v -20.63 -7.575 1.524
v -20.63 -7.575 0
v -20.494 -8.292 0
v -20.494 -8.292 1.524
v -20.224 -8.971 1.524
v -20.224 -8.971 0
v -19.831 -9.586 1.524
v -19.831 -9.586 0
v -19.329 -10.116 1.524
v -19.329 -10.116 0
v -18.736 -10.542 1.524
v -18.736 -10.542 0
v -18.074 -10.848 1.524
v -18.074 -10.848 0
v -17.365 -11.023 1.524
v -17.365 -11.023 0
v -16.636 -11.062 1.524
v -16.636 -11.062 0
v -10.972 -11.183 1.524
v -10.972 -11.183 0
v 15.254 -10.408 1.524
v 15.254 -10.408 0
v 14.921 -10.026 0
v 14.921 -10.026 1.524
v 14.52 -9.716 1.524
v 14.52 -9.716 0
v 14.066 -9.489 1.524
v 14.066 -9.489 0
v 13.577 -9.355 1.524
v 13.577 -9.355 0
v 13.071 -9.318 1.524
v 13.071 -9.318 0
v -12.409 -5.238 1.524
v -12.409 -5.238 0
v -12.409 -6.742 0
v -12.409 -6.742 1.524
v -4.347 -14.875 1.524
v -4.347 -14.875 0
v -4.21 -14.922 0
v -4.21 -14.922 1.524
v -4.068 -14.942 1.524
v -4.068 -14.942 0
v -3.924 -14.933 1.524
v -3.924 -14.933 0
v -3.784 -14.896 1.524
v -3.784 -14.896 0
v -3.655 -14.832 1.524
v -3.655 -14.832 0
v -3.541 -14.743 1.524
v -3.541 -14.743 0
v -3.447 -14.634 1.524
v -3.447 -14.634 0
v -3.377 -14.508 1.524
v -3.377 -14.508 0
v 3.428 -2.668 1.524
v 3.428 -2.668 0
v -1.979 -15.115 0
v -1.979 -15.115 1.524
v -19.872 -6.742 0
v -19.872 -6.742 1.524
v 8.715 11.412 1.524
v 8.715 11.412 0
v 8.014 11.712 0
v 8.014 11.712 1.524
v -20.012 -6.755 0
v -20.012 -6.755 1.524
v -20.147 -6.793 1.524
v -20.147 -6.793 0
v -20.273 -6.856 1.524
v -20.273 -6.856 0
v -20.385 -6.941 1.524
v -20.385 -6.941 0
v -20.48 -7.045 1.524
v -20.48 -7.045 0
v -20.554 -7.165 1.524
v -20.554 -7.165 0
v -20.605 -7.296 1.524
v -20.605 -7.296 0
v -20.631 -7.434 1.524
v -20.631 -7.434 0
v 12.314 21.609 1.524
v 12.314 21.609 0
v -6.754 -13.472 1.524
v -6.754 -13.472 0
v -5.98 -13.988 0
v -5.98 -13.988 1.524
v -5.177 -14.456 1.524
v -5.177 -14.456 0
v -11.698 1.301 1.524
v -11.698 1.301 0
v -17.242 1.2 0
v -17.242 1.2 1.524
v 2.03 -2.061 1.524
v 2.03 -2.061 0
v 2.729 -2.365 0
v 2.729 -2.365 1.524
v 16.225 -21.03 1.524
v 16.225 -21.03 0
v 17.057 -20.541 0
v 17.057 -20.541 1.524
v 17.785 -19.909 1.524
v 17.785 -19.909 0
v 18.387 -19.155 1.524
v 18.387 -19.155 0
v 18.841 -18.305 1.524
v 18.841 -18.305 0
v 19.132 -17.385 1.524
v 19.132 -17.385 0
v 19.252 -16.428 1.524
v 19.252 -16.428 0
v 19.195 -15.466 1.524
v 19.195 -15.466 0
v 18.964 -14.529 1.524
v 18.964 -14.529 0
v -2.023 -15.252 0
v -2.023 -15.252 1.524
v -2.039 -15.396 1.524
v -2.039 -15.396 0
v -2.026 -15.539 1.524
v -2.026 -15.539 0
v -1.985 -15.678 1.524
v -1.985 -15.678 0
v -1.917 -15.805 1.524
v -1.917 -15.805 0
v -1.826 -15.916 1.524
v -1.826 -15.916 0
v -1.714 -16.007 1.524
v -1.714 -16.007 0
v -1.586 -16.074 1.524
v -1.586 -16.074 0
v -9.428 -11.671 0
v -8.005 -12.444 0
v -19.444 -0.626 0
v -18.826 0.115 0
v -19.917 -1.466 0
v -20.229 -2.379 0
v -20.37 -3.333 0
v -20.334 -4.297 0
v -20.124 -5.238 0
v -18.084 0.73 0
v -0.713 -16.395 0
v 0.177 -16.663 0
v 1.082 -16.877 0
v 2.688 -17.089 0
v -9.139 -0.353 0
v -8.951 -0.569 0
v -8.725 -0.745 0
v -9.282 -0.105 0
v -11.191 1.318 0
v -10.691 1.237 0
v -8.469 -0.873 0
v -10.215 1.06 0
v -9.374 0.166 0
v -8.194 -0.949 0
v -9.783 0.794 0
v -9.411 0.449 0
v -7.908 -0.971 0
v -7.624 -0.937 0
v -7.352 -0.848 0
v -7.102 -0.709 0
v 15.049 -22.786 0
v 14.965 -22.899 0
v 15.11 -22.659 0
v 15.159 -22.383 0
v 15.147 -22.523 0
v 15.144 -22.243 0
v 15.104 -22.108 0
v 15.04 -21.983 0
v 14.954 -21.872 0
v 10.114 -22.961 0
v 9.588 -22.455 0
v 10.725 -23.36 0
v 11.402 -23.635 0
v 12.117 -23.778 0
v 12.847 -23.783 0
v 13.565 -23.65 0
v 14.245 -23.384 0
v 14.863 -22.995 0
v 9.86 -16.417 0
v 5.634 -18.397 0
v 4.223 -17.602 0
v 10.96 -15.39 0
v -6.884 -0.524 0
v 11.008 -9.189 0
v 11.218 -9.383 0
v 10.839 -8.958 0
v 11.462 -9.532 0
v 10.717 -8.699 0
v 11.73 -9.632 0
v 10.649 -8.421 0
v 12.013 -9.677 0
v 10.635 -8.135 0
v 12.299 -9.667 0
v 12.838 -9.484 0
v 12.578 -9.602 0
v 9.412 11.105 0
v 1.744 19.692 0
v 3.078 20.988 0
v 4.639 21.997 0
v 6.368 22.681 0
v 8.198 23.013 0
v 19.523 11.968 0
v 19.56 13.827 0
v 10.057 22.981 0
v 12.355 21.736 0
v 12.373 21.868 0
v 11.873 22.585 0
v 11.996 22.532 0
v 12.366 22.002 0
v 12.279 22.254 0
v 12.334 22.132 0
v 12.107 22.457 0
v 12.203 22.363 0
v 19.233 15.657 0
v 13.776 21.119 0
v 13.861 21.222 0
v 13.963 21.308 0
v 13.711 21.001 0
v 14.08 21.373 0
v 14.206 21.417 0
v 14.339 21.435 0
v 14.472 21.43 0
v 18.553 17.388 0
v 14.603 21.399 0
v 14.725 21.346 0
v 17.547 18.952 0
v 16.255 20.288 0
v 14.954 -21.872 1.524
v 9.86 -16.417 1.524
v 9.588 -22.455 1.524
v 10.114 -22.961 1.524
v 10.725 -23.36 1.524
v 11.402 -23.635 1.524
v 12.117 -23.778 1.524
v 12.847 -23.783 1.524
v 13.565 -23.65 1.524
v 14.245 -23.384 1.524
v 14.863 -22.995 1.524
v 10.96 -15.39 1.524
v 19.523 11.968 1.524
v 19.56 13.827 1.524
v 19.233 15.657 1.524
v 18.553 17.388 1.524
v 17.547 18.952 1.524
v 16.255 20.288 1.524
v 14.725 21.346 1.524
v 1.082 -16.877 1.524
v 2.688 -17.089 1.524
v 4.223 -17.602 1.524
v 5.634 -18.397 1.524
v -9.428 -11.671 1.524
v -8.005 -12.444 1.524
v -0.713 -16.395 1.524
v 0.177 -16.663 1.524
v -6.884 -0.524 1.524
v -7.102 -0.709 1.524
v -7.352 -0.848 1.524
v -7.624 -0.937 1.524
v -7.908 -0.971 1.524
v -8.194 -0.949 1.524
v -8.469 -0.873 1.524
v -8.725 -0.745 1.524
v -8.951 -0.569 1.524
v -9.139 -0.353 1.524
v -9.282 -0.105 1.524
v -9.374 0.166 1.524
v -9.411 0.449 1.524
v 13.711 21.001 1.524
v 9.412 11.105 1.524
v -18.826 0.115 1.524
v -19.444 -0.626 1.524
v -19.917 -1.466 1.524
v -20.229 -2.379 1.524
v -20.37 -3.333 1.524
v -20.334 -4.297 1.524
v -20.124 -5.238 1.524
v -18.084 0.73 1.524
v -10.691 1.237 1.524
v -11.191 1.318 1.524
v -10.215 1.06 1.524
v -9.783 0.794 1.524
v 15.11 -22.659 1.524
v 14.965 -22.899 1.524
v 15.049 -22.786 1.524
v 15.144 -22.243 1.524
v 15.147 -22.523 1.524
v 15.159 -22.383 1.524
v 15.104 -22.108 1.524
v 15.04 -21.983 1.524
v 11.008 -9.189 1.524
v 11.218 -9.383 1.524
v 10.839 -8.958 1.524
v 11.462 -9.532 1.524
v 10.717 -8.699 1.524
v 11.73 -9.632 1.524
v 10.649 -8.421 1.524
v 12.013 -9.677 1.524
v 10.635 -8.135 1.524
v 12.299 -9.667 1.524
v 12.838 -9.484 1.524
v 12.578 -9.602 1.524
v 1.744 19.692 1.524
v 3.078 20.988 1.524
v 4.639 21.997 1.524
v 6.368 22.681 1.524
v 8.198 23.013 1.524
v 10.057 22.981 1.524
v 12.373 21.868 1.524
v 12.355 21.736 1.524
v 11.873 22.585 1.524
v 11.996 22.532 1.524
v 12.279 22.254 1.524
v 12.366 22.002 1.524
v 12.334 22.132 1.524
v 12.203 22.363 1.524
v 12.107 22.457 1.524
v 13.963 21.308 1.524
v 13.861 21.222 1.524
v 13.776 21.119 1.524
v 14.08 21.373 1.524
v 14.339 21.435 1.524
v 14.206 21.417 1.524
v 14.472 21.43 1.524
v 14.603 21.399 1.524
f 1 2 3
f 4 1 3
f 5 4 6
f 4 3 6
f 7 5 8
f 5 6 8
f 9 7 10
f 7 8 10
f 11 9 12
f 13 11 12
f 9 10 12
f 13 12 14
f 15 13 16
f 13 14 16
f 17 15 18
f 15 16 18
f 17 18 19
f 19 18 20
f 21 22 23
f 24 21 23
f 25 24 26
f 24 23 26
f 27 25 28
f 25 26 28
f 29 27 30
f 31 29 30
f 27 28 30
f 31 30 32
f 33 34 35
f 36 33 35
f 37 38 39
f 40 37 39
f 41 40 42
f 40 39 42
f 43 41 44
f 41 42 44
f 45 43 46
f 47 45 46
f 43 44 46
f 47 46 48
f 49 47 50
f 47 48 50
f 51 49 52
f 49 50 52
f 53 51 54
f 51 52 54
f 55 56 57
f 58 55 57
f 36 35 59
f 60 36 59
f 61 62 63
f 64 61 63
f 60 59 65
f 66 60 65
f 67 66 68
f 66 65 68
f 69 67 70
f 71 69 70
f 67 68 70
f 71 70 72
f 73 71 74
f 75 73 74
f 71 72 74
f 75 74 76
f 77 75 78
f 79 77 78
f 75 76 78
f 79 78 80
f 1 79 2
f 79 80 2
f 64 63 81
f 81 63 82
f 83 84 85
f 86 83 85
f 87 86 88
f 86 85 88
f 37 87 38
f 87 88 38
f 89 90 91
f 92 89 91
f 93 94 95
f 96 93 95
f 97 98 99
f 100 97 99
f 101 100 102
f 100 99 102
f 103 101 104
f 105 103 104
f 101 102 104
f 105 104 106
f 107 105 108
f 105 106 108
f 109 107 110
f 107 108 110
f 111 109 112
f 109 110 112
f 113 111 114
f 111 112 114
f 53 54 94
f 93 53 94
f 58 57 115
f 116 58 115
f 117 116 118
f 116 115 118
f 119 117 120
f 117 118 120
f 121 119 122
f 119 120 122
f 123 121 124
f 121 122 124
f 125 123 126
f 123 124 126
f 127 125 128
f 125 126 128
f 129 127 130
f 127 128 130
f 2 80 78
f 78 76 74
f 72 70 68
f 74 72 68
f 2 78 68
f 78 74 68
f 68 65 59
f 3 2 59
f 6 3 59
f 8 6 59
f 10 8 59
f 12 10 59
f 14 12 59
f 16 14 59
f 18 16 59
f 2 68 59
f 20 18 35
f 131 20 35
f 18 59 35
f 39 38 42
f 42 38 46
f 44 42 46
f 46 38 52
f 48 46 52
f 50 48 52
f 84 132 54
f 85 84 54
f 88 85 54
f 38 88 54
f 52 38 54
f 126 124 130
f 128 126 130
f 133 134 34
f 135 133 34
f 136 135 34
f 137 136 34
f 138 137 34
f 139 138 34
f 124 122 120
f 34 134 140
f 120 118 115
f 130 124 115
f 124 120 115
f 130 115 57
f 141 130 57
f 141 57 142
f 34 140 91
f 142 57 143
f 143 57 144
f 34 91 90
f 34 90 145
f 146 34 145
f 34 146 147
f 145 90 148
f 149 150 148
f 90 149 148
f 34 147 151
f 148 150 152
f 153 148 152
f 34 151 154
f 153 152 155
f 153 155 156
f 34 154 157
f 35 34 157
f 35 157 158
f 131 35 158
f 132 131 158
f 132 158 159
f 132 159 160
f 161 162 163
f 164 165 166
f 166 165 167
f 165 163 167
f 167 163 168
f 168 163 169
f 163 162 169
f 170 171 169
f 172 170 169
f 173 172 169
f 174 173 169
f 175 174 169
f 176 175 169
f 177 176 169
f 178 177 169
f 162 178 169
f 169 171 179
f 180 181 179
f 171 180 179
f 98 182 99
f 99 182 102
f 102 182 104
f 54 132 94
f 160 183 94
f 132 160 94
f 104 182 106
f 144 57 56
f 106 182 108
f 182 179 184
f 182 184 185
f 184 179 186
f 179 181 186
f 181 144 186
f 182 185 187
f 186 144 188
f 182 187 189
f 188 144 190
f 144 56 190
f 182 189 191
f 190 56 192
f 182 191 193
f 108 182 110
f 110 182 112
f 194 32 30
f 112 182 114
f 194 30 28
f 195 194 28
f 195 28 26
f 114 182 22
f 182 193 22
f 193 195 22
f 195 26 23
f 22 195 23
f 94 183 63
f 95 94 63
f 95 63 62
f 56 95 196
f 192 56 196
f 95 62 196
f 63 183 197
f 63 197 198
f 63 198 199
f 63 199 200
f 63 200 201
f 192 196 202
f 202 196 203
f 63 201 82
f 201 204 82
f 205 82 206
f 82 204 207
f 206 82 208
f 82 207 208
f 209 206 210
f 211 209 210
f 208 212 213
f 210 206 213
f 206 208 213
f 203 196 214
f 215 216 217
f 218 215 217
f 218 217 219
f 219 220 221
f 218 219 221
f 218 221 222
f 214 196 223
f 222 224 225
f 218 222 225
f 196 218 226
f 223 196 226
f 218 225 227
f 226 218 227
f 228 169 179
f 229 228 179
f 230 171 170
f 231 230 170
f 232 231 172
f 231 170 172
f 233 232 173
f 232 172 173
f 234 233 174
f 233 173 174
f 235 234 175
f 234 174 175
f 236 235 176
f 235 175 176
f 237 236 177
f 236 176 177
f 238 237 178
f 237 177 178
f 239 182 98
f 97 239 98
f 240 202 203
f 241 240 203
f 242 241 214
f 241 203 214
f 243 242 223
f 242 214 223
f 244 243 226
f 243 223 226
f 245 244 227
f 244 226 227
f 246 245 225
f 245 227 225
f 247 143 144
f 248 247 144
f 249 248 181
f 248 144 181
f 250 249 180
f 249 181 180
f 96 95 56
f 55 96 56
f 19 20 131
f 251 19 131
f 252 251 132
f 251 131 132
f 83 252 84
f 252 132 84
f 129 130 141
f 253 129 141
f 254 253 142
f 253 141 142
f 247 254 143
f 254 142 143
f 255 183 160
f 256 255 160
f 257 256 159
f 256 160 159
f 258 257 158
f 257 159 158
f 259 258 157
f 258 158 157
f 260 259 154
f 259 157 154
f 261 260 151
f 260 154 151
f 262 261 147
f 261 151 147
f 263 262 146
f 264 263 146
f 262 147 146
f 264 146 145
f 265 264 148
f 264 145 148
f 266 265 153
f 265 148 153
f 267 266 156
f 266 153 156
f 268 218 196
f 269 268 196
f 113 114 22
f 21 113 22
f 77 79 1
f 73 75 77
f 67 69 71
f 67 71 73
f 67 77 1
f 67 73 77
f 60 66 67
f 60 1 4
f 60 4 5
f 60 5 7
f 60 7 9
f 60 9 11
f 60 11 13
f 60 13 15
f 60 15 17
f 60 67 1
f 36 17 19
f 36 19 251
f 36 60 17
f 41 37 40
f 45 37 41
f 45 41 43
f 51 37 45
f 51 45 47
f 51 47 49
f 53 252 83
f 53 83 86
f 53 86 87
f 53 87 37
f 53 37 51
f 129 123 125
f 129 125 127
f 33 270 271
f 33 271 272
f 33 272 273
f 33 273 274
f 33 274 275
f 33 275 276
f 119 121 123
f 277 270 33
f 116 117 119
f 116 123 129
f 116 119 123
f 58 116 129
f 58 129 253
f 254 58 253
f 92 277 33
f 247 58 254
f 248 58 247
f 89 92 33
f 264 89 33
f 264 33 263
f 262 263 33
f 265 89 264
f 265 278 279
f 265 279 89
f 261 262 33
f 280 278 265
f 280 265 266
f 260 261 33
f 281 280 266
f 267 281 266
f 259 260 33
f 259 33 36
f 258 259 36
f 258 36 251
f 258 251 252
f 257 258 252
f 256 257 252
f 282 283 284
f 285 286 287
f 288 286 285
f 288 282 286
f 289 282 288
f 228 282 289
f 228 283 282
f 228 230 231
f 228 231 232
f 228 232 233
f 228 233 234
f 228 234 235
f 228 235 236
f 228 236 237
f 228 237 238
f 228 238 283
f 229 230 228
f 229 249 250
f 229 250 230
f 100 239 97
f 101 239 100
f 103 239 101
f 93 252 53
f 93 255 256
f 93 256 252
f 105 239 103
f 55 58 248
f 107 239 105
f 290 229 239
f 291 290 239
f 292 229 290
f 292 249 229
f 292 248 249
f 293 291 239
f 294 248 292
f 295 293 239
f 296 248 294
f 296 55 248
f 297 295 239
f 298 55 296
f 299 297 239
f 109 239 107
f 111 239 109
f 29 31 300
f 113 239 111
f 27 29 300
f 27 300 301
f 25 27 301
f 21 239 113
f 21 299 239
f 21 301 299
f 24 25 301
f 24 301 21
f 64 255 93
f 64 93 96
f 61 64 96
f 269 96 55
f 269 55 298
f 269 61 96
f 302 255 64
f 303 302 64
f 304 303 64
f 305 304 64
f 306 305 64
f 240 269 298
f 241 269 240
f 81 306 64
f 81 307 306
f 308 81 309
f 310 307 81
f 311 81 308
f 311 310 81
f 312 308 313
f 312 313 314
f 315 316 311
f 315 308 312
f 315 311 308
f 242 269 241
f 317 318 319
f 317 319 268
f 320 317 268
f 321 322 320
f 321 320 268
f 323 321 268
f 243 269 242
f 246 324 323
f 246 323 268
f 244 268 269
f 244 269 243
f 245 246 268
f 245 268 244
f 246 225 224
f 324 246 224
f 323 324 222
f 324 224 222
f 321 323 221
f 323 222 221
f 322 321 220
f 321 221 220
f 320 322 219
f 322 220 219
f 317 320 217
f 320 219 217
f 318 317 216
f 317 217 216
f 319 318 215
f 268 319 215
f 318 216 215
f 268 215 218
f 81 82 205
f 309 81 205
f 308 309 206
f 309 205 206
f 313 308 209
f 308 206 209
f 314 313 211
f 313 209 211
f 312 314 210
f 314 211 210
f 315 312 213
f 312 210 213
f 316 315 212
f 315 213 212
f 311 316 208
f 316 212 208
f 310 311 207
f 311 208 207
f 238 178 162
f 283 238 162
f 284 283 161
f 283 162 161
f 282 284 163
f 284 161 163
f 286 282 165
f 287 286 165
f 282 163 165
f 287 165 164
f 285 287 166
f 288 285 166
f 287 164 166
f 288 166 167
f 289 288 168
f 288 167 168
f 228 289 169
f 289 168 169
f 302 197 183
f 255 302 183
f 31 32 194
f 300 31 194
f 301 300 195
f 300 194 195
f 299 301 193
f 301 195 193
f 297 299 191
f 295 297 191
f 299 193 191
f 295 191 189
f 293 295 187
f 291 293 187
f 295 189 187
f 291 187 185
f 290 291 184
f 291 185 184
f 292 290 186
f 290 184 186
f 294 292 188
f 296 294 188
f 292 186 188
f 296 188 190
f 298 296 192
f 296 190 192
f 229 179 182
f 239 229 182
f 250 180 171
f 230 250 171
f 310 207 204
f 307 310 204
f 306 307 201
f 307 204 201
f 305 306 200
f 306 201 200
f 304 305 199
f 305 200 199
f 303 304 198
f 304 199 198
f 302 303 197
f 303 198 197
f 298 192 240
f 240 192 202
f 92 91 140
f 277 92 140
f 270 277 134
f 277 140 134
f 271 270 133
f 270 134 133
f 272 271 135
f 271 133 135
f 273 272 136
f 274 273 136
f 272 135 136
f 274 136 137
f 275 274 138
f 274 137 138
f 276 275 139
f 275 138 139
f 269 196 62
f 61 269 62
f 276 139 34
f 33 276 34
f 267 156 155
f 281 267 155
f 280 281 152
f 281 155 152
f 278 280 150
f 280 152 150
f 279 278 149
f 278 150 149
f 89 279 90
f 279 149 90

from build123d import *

# Parameters (mm, degrees)
BOSS_EXTRUDE1_DEPTH = 1.524


with BuildPart() as part:
    # Sketch1 → Boss-Extrude1 (new body)
    with BuildSketch(Plane.XY):
        with BuildLine():
            Line((-11.698031226, 1.301080189), (-17.241997575, 1.200259383))
            ThreePointArc((-17.241997575, 1.200259383), (-19.917117147, -1.466260827), (-20.124051829, -5.237702565))
            Line((-20.124051829, -5.237702565), (-12.408600231, -5.237702565))
            Line((-12.408600231, -5.237702565), (-12.408600231, -6.741954445))
            Line((-12.408600231, -6.741954445), (-19.871811516, -6.741954445))
            ThreePointArc((-19.871811516, -6.741954445), (-20.435206751, -6.990895181), (-20.630486437, -7.57506256))
            ThreePointArc((-20.630486437, -7.57506256), (-19.329359364, -10.115853363), (-16.636177401, -11.062067125))
            Line((-16.636177401, -11.062067125), (-10.972091682, -11.182579587))
            ThreePointArc((-10.972091682, -11.182579587), (-8.698171192, -12.023613454), (-6.754136813, -13.472331057))
            ThreePointArc((-6.754136813, -13.472331057), (-5.581948581, -14.227787409), (-4.346508881, -14.874647747))
            ThreePointArc((-4.346508881, -14.874647747), (-3.784346366, -14.895857379), (-3.377122413, -14.507726996))
            Line((-3.377122413, -14.507726996), (2.03023888, -2.061232355))
            Line((2.03023888, -2.061232355), (2.729092759, -2.364954689))
            Line((2.729092759, -2.364954689), (3.428024886, -2.668496912))
            Line((3.428024886, -2.668496912), (-1.97931368, -15.115001427))
            ThreePointArc((-1.97931368, -15.115001427), (-1.98510287, -15.677534117), (-1.585953772, -16.073963859))
            ThreePointArc((-1.585953772, -16.073963859), (-0.270018612, -16.535541807), (1.082127376, -16.876776006))
            ThreePointArc((1.082127376, -16.876776006), (3.467746446, -17.309065277), (5.634318126, -18.397191884))
            Line((5.634318126, -18.397191884), (9.587844362, -22.455026355))
            ThreePointArc((9.587844362, -22.455026355), (12.117419518, -23.777826074), (14.862522696, -22.994909661))
            ThreePointArc((14.862522696, -22.994909661), (15.156242938, -22.453509531), (14.953714903, -21.871815388))
            Line((14.953714903, -21.871815388), (9.860467214, -16.416693879))
            Line((9.860467214, -16.416693879), (10.959977394, -15.390121387))
            Line((10.959977394, -15.390121387), (16.22536578, -21.029614141))
            ThreePointArc((16.22536578, -21.029614141), (18.840822131, -18.304548485), (18.964246905, -14.529450993))
            Line((18.964246905, -14.529450993), (15.254476006, -10.408367691))
            ThreePointArc((15.254476006, -10.408367691), (14.298724728, -9.591322549), (13.07136856, -9.318155738))
            ThreePointArc((13.07136856, -9.318155738), (11.462041147, -9.532232913), (10.635341819, -8.134974174))
            Line((10.635341819, -8.134974174), (19.523278228, 11.967818074))
            ThreePointArc((19.523278228, 11.967818074), (18.552858543, 17.387639375), (14.725205948, 21.345574811))
            ThreePointArc((14.725205948, 21.345574811), (14.142053039, 21.397936165), (13.711309854, 21.001364186))
            Line((13.711309854, 21.001364186), (9.411697856, 11.104602687))
            Line((9.411697856, 11.104602687), (8.714639229, 11.412422878))
            Line((8.714639229, 11.412422878), (8.013937, 11.711856318))
            Line((8.013937, 11.711856318), (12.313567068, 21.608609967))
            ThreePointArc((12.313567068, 21.608609967), (12.30947588, 22.194094628), (11.873232067, 22.584607574))
            ThreePointArc((11.873232067, 22.584607574), (6.368068152, 22.681290418), (1.744271471, 19.691862119))
            Line((1.744271471, 19.691862119), (-6.884013371, -0.52373509))
            ThreePointArc((-6.884013371, -0.52373509), (-8.469497177, -0.873027031), (-9.411301698, 0.449382892))
            ThreePointArc((-9.411301698, 0.449382892), (-10.448574638, 1.160078409), (-11.698031226, 1.301080189))
        make_face()
    extrude(amount=BOSS_EXTRUDE1_DEPTH)


solid = part.part
